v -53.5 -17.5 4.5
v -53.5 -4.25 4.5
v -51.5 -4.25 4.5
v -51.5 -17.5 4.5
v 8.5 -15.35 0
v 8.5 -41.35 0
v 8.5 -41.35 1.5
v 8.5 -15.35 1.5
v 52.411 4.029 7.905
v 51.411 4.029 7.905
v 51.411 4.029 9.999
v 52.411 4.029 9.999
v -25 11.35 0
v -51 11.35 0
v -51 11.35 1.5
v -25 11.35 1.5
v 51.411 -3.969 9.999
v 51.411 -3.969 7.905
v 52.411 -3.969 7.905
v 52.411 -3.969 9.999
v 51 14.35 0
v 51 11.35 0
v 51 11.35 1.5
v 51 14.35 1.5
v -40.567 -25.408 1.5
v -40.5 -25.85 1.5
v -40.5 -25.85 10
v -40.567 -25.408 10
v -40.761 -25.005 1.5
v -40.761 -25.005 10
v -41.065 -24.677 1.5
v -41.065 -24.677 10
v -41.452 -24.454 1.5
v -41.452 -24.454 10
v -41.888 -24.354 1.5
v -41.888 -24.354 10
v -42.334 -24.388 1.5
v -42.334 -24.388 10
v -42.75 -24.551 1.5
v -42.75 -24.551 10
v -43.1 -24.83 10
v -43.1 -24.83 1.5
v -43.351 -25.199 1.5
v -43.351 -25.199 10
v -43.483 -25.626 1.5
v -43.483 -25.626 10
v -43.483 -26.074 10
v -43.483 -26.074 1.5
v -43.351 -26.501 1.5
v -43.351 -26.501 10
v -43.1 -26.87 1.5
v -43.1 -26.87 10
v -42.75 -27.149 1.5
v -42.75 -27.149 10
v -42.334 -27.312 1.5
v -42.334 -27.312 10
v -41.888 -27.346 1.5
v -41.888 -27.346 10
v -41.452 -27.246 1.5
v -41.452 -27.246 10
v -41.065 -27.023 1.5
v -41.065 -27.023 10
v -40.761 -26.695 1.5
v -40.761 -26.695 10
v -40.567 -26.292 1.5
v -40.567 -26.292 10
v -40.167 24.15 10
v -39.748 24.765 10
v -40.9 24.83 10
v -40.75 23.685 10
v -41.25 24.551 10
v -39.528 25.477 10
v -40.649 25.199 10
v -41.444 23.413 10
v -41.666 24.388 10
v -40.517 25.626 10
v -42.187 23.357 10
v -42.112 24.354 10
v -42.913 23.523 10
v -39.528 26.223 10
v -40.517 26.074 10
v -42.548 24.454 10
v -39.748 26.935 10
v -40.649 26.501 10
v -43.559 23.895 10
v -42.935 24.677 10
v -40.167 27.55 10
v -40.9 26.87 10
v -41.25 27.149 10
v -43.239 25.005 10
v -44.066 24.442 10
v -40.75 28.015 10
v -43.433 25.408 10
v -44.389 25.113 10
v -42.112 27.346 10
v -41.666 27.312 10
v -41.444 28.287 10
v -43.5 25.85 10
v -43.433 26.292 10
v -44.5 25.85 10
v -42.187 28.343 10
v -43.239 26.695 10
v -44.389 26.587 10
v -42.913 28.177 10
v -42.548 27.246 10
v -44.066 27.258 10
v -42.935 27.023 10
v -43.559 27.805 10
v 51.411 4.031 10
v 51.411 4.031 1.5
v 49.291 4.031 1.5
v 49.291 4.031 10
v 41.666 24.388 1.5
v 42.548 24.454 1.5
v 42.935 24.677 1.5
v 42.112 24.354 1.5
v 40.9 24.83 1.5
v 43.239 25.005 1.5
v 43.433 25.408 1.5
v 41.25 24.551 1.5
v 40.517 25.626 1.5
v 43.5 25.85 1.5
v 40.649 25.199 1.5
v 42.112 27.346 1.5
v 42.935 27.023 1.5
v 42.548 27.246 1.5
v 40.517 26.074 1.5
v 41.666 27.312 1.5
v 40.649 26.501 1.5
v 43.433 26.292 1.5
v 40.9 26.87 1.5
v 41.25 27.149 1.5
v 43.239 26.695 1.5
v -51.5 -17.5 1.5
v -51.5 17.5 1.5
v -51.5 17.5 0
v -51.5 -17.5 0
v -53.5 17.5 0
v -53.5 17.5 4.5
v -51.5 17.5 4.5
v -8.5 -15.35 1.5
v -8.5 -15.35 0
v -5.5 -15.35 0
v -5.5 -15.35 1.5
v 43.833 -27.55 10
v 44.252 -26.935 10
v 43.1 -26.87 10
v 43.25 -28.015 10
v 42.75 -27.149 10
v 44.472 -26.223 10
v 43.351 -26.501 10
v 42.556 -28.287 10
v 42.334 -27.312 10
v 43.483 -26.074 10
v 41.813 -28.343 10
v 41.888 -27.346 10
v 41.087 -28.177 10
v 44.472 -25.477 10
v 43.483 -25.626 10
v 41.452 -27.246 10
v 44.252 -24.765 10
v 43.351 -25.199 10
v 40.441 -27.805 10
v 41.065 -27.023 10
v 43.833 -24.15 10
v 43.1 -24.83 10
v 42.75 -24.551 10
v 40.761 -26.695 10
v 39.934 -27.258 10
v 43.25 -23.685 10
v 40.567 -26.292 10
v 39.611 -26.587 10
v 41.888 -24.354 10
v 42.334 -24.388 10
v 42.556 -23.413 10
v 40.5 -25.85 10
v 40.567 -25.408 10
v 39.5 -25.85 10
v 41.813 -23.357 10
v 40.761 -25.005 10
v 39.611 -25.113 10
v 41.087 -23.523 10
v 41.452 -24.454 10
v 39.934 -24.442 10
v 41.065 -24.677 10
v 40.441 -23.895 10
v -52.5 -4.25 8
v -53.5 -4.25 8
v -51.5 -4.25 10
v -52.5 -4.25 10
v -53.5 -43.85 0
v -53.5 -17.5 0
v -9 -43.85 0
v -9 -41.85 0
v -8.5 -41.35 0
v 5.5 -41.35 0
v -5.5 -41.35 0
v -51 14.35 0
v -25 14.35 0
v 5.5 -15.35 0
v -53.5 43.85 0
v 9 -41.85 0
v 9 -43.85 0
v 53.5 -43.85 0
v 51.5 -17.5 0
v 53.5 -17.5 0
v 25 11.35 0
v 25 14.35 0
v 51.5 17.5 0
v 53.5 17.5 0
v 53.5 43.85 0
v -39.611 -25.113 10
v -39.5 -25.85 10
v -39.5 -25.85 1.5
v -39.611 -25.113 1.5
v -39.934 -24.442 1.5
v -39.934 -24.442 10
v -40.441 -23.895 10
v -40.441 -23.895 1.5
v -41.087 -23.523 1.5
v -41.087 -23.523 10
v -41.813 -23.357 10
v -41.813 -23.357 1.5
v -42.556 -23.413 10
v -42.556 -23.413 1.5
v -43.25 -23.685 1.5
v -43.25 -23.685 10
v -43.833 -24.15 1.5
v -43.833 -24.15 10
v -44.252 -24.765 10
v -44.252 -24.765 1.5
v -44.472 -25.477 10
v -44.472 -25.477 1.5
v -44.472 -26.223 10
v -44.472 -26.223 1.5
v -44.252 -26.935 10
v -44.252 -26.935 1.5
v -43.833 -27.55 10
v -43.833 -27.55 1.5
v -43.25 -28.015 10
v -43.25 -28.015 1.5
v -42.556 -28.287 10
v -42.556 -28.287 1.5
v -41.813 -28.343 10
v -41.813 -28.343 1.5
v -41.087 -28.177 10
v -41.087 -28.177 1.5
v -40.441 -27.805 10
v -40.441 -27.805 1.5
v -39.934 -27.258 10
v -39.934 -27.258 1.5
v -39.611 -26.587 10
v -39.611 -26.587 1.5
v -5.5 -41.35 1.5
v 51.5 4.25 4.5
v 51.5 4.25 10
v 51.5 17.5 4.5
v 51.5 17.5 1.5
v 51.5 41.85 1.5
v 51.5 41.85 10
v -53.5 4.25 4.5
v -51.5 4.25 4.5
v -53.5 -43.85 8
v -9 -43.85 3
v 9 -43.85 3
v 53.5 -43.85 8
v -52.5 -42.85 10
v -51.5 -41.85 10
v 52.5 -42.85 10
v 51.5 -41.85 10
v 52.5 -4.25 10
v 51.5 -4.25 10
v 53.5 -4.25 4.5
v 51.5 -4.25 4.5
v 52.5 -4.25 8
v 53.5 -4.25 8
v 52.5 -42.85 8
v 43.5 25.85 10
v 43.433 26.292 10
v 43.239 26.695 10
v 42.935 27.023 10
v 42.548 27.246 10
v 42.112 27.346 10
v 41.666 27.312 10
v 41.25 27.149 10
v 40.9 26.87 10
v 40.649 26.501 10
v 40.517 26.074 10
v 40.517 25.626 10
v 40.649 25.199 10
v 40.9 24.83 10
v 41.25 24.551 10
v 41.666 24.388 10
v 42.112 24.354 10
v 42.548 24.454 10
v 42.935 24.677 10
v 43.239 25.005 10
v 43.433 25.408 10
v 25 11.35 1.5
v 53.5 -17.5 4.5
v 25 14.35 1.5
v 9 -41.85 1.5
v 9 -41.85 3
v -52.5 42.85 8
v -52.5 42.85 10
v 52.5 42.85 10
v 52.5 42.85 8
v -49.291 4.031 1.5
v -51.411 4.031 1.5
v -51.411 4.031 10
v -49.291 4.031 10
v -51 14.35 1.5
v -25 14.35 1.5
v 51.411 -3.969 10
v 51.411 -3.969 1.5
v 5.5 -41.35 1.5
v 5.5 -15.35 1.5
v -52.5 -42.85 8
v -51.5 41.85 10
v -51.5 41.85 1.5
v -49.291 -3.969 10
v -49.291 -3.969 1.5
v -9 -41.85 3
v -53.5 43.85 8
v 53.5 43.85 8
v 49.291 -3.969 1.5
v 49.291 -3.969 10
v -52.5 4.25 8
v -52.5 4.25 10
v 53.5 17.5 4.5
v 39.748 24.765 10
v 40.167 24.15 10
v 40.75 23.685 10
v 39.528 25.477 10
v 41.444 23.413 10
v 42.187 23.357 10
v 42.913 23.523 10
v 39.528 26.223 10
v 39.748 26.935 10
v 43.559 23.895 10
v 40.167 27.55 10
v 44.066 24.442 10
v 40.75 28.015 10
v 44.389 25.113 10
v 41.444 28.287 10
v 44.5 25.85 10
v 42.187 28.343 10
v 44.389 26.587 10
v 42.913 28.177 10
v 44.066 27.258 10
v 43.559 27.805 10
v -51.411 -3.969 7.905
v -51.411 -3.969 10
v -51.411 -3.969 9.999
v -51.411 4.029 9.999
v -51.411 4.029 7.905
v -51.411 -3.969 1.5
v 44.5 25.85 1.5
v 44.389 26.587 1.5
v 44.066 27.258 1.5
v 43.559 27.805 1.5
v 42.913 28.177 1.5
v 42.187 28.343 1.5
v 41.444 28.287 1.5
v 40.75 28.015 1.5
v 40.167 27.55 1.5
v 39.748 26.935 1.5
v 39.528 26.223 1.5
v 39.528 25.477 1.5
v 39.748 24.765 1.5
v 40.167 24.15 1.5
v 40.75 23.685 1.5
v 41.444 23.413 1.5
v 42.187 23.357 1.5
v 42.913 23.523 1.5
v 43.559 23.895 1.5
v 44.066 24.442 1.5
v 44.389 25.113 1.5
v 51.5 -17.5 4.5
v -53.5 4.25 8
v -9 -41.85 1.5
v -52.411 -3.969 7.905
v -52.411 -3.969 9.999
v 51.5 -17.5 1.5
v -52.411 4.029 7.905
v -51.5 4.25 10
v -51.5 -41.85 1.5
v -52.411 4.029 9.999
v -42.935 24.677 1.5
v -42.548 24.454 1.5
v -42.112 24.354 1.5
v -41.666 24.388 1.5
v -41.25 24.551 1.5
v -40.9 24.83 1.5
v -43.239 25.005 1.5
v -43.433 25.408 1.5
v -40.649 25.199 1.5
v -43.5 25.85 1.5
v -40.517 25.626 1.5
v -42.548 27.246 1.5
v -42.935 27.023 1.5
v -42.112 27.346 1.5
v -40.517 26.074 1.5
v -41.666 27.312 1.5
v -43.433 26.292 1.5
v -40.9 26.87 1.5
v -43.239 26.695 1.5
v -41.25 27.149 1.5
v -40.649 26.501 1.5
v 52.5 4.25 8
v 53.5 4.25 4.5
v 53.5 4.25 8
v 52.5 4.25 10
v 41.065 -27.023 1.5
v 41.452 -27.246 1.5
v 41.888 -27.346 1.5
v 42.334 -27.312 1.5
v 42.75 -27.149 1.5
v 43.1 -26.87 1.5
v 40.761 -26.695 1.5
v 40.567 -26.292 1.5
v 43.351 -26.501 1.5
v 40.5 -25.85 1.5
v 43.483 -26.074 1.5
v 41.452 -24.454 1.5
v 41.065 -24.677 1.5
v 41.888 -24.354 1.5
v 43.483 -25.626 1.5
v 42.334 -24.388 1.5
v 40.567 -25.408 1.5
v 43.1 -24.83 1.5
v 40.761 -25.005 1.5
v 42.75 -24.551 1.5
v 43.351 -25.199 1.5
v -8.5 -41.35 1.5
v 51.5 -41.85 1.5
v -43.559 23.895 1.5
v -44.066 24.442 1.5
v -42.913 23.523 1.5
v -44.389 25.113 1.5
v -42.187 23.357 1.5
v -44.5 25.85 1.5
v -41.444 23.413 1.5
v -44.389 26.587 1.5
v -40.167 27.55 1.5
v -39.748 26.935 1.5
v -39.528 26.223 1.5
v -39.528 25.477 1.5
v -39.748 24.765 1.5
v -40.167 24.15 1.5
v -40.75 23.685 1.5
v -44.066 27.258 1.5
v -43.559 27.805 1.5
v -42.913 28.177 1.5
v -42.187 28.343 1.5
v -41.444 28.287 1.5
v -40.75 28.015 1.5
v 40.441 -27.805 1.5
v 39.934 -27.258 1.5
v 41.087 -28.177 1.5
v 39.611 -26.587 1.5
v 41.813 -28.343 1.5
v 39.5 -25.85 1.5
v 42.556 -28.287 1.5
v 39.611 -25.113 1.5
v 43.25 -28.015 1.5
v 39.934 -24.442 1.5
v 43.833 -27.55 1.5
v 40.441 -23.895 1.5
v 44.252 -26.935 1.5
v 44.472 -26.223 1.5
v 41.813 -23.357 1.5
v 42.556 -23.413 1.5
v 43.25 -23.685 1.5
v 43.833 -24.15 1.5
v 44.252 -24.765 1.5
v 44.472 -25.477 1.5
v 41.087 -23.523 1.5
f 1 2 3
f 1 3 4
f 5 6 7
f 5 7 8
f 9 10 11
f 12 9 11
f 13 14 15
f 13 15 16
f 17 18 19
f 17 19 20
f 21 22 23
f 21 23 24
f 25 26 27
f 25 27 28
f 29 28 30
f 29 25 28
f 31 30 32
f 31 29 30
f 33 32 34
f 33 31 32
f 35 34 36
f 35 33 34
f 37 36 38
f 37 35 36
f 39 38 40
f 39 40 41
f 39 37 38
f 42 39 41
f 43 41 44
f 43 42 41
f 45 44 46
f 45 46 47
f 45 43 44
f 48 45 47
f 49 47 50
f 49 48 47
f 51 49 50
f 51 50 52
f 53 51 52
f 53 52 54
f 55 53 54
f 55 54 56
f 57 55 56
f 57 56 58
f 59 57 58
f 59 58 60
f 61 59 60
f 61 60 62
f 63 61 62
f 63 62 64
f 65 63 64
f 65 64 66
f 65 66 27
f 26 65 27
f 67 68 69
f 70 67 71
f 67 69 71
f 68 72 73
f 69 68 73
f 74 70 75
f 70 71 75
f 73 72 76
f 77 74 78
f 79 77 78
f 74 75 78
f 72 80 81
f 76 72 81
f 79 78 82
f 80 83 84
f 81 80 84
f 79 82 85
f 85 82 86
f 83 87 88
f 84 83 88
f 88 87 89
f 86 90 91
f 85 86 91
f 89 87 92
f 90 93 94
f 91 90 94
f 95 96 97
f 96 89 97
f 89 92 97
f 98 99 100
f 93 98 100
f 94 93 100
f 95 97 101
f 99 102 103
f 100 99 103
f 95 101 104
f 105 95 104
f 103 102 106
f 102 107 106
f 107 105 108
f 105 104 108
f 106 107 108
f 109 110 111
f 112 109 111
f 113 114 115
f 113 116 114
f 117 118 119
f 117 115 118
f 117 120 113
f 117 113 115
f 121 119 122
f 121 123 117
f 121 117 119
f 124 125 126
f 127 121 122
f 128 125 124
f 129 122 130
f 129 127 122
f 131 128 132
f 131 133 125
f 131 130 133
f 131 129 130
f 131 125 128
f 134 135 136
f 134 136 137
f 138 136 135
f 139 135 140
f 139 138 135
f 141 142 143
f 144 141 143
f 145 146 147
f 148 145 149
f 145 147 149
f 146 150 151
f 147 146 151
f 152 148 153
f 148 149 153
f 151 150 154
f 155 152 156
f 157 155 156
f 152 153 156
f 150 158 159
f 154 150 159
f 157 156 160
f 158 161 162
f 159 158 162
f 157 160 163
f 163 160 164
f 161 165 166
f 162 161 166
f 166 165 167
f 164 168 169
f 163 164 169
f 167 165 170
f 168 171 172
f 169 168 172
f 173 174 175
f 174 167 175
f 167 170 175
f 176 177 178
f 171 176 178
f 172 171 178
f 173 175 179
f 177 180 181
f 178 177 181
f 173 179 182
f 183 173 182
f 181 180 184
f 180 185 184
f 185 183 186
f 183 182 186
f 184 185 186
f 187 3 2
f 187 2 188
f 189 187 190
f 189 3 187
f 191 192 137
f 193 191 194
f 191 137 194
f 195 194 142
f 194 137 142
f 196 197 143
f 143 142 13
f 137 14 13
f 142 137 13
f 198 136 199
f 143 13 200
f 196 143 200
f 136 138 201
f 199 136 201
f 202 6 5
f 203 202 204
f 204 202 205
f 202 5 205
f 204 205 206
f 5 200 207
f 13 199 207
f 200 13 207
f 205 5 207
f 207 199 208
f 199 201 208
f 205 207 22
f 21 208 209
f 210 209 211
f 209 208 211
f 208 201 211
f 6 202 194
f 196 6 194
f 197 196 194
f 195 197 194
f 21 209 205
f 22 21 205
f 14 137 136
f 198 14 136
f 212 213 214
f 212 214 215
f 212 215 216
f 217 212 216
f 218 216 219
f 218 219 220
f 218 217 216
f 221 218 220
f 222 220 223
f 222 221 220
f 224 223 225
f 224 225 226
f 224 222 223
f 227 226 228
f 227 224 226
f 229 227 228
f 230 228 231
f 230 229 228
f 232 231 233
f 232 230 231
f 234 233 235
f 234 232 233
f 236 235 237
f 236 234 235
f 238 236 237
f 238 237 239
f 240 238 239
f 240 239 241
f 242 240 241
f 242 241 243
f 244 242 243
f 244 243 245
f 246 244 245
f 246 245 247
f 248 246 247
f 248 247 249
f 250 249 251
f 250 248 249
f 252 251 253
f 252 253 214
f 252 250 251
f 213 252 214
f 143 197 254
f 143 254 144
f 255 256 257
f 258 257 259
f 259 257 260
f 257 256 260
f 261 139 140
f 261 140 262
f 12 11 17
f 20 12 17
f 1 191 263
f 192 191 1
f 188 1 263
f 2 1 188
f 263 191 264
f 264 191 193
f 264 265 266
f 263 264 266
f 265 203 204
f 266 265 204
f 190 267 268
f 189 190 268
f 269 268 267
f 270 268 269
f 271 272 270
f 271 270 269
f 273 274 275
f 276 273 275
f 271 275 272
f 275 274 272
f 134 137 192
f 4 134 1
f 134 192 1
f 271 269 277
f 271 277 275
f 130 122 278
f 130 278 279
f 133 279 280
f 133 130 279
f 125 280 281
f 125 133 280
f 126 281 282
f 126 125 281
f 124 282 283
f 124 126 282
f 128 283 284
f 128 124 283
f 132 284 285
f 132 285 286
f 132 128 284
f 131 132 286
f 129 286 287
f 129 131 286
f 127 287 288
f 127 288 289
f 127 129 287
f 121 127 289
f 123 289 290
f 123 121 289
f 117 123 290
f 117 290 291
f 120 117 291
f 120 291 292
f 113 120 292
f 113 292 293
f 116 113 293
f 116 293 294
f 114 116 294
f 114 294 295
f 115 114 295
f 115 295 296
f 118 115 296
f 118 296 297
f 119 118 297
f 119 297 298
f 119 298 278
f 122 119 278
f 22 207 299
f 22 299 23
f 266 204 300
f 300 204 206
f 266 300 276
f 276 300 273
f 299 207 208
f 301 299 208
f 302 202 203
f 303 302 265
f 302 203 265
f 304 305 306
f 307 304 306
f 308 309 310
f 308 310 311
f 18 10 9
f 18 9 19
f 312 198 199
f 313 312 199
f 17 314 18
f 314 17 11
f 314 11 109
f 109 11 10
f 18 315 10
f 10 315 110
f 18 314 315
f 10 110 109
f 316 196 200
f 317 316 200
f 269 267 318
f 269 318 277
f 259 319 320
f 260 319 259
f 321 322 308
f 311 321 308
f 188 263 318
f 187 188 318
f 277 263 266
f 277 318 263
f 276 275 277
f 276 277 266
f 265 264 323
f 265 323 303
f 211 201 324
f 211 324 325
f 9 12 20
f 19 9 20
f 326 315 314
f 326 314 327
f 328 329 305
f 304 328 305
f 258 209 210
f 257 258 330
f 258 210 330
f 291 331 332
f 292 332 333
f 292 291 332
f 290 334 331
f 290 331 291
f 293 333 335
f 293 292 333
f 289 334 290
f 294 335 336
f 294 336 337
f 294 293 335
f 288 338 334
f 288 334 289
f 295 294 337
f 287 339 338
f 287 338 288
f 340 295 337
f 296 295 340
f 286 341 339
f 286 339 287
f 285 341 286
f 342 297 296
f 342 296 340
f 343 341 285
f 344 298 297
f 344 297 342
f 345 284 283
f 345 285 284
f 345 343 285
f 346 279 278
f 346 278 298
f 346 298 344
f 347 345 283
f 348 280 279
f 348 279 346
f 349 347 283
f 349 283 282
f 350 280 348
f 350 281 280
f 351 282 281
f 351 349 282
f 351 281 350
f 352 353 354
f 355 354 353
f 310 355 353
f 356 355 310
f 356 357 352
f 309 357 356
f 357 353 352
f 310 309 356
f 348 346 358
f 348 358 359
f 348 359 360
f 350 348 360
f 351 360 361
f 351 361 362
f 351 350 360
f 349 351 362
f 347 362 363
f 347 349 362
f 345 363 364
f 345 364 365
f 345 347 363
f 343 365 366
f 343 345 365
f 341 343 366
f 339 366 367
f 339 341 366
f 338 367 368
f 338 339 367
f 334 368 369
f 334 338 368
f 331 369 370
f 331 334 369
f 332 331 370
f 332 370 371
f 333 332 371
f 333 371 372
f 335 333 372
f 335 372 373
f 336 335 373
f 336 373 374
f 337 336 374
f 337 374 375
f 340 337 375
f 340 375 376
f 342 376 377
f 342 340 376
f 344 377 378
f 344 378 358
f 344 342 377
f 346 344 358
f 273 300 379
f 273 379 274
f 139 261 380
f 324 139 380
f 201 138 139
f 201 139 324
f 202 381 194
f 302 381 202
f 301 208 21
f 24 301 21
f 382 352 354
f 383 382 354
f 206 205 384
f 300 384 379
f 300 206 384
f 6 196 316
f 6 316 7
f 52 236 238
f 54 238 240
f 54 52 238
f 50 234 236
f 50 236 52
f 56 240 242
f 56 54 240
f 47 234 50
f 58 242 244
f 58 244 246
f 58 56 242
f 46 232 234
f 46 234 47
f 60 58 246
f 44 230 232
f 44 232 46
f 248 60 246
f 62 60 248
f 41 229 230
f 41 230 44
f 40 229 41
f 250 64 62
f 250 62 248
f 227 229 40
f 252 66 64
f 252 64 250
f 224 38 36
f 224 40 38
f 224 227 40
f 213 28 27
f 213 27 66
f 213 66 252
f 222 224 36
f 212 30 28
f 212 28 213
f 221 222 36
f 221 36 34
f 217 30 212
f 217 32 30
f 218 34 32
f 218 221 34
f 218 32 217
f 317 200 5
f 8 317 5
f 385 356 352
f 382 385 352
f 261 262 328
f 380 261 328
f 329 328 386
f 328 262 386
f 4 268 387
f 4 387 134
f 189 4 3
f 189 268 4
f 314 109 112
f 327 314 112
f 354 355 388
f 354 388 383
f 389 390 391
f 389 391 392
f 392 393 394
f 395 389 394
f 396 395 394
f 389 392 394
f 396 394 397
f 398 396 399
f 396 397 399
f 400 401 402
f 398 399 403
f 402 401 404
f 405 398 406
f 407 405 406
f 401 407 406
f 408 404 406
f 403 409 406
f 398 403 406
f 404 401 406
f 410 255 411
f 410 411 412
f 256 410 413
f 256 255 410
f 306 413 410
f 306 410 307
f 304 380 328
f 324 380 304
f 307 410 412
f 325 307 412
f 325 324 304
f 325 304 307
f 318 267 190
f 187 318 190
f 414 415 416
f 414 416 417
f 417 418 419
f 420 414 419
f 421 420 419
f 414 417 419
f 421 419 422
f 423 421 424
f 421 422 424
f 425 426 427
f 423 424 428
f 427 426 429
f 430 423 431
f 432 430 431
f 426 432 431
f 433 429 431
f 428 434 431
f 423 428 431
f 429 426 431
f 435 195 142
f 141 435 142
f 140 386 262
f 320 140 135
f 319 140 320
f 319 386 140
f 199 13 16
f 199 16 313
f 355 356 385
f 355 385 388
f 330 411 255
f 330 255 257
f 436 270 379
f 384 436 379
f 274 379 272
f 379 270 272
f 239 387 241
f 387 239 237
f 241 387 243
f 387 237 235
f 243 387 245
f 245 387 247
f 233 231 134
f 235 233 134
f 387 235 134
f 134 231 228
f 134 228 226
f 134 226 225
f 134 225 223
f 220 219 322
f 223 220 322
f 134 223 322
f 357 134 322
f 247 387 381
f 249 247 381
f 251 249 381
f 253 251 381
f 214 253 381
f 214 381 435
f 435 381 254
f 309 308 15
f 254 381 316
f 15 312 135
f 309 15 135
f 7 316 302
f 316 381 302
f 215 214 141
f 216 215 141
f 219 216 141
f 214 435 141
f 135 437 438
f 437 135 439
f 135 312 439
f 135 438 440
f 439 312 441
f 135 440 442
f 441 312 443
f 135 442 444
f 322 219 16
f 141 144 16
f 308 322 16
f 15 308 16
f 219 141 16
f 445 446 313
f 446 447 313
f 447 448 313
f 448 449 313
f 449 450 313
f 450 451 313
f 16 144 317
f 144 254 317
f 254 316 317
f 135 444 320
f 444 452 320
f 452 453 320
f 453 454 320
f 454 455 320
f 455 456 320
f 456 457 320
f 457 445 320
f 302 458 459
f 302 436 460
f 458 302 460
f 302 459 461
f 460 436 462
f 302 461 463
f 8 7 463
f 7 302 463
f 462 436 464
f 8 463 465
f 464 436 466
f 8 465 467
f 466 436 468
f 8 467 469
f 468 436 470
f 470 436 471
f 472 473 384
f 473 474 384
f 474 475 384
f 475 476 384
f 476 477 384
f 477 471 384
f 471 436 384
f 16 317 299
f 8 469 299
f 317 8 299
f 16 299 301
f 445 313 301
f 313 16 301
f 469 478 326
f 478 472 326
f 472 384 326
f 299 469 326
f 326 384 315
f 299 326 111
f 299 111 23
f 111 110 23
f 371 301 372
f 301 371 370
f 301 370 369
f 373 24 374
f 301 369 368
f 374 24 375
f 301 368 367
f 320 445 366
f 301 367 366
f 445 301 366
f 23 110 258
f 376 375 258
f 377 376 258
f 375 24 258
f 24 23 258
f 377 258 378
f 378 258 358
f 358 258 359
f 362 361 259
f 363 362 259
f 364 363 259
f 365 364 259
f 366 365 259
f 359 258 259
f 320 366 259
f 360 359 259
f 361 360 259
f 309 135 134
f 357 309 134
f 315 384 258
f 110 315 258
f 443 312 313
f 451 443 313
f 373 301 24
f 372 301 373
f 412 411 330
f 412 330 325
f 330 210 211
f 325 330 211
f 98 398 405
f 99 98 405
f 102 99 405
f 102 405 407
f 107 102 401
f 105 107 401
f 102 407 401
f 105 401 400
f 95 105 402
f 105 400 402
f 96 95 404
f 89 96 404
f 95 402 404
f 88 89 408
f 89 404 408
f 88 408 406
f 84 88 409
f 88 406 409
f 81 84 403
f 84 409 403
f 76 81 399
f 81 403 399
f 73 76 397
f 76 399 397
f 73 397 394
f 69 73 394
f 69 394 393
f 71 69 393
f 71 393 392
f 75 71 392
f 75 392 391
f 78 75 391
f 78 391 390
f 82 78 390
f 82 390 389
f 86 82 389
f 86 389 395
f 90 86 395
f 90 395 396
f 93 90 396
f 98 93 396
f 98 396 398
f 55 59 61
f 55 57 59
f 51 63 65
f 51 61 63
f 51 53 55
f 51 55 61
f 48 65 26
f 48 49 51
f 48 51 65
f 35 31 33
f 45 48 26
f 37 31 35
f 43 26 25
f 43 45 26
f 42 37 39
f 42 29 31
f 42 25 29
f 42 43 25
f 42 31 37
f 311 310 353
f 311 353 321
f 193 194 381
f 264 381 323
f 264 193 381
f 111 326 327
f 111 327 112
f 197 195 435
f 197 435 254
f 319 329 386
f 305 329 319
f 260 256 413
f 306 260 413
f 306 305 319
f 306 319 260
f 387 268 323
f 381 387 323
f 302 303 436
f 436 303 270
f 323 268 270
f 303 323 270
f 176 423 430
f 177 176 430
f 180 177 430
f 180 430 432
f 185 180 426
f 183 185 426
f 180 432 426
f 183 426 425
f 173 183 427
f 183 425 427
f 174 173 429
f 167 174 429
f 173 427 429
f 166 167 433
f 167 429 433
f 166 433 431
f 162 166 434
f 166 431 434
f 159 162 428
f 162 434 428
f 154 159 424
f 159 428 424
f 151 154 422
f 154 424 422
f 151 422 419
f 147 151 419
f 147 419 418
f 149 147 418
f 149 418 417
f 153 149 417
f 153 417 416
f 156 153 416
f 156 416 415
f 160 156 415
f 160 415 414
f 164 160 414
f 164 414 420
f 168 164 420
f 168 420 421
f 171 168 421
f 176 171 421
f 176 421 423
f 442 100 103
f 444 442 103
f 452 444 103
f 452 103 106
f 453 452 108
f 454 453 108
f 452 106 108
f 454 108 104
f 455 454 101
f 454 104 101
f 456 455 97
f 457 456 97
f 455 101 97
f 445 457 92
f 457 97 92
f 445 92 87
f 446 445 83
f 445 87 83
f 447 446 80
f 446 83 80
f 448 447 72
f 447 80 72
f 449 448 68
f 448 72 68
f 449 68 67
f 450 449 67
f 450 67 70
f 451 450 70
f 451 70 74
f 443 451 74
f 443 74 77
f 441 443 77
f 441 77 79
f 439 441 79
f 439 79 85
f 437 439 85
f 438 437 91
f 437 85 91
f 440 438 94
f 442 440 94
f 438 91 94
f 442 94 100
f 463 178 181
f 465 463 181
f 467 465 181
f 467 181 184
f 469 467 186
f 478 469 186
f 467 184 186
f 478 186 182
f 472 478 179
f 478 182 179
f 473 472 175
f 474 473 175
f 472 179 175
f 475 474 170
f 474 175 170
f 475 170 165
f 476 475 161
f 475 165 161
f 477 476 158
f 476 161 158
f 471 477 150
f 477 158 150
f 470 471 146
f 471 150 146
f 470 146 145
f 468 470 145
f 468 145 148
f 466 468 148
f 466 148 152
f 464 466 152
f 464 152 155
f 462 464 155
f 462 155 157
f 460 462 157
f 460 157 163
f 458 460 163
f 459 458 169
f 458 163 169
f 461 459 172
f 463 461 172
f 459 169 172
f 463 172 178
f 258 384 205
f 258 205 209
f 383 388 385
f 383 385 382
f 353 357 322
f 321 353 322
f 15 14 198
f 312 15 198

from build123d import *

# Parameters (mm, degrees)
SKETCH_W             = 107
SKETCH_H             = 87.7
SKETCH_R             = 1.5
SKETCH_W_2           = 3
SKETCH_H_2           = 26
SKETCH_W_3           = 26
SKETCH_H_3           = 3
PAD_DEPTH            = 10
SKETCH001_W          = 103
SKETCH001_H          = 83.7
SKETCH001_R          = 2.5
POCKET_DEPTH         = 8.5
SKETCH002_W          = 107
SKETCH002_H          = 87.7
SKETCH002_W_2        = 105
SKETCH002_H_2        = 85.7
POCKET001_DEPTH      = 2
SKETCH003_W          = 8.5
SKETCH003_H          = 8.5
POCKET002_DEPTH      = 53.501
POCKET002_DEPTH_BACK = 53.501
SKETCH004_W          = 18
SKETCH004_H          = 3
POCKET003_DEPTH      = 2
SKETCH005_W          = 35
SKETCH005_H          = 4.5
POCKET004_DEPTH      = 2
SKETCH006_W          = 35
SKETCH006_H          = 4.5
POCKET005_DEPTH      = 2
SKETCH007_W          = 2.120422
SKETCH007_H          = 8
PAD001_DEPTH         = 8.5
SKETCH008_W          = 7.99724
SKETCH008_H          = 2.093498
PAD002_DEPTH         = 1


with BuildPart() as part:
    # Sketch → Pad (new body)
    with BuildSketch(Plane.XY):
        Rectangle(SKETCH_W, SKETCH_H)
        with Locations((-42, -25.85)):
            Circle(SKETCH_R, mode=Mode.SUBTRACT)
        with Locations((42, 25.85)):
            Circle(SKETCH_R, mode=Mode.SUBTRACT)
        with Locations((-7, -28.35)):
            Rectangle(SKETCH_W_2, SKETCH_H_2, mode=Mode.SUBTRACT)
        with Locations((7, -28.35)):
            Rectangle(SKETCH_W_2, SKETCH_H_2, mode=Mode.SUBTRACT)
        with Locations((38, 12.85)):
            Rectangle(SKETCH_W_3, SKETCH_H_3, mode=Mode.SUBTRACT)
        with Locations((-38, 12.85)):
            Rectangle(SKETCH_W_3, SKETCH_H_3, mode=Mode.SUBTRACT)
    extrude(amount=PAD_DEPTH)

    # Sketch001 (on Face24 of Pad) → Pocket (cut)
    with BuildSketch(Plane.XY.offset(10)):
        Rectangle(SKETCH001_W, SKETCH001_H)
        with Locations((-42, -25.85)):
            Circle(SKETCH001_R, mode=Mode.SUBTRACT)
        with Locations((42, 25.85)):
            Circle(SKETCH001_R, mode=Mode.SUBTRACT)
    extrude(amount=-POCKET_DEPTH, mode=Mode.SUBTRACT)

    # Sketch002 (on Face5 of Pocket) → Pocket001 (cut)
    with BuildSketch(Plane.XY.offset(10)):
        Rectangle(SKETCH002_W, SKETCH002_H)
        Rectangle(SKETCH002_W_2, SKETCH002_H_2, mode=Mode.SUBTRACT)
    extrude(amount=-POCKET001_DEPTH, mode=Mode.SUBTRACT)

    # Sketch003 → Pocket002 (cut, two sides)
    with BuildSketch(Plane.YZ) as pocket002_sk:
        with Locations((0, 5.75)):
            Rectangle(SKETCH003_W, SKETCH003_H)
    extrude(amount=-POCKET002_DEPTH, mode=Mode.SUBTRACT)
    extrude(pocket002_sk.sketch, amount=POCKET002_DEPTH_BACK, mode=Mode.SUBTRACT)

    # Sketch004 (on Face1 of Pocket002) → Pocket003 (cut)
    with BuildSketch(Plane.XZ.offset(43.85)):
        with Locations((0, 1.5)):
            Rectangle(SKETCH004_W, SKETCH004_H)
    extrude(amount=-POCKET003_DEPTH, mode=Mode.SUBTRACT)

    # Sketch005 (on Face6 of Pocket003) → Pocket004 (cut)
    with BuildSketch(Plane.YZ.offset(53.5)):
        with Locations((0, 2.25)):
            Rectangle(SKETCH005_W, SKETCH005_H)
    extrude(amount=-POCKET004_DEPTH, mode=Mode.SUBTRACT)

    # Sketch006 (on Face8 of Pocket004) → Pocket005 (cut)
    with BuildSketch(Plane(origin=(-53.5, 0, 0), x_dir=(0, -1, 0), z_dir=(-1, 0, 0))):
        with Locations((0, 2.25)):
            Rectangle(SKETCH006_W, SKETCH006_H)
    extrude(amount=-POCKET005_DEPTH, mode=Mode.SUBTRACT)

    # Sketch007 (on Face49 of Pocket005) → Pad001 (join)
    with BuildSketch(Plane.XY.offset(1.5)):
        with Locations((-50.350937, 0.030608)):
            Rectangle(SKETCH007_W, SKETCH007_H)
    extrude(amount=PAD001_DEPTH)

    # Sketch008 (on Face64 of Pad001) → Pad002 (join)
    with BuildSketch(Plane(origin=(-51.411148, 0, 0), x_dir=(0, -1, 0), z_dir=(-1, 0, 0))):
        with Locations((-0.030066, 8.95208)):
            Rectangle(SKETCH008_W, SKETCH008_H)
    extrude(amount=PAD002_DEPTH)

    # Mirrored: part across YZ


with BuildPart() as part_1:
    add(part.part)
    add(part.part.mirror(Plane.YZ))


solid = part_1.part
